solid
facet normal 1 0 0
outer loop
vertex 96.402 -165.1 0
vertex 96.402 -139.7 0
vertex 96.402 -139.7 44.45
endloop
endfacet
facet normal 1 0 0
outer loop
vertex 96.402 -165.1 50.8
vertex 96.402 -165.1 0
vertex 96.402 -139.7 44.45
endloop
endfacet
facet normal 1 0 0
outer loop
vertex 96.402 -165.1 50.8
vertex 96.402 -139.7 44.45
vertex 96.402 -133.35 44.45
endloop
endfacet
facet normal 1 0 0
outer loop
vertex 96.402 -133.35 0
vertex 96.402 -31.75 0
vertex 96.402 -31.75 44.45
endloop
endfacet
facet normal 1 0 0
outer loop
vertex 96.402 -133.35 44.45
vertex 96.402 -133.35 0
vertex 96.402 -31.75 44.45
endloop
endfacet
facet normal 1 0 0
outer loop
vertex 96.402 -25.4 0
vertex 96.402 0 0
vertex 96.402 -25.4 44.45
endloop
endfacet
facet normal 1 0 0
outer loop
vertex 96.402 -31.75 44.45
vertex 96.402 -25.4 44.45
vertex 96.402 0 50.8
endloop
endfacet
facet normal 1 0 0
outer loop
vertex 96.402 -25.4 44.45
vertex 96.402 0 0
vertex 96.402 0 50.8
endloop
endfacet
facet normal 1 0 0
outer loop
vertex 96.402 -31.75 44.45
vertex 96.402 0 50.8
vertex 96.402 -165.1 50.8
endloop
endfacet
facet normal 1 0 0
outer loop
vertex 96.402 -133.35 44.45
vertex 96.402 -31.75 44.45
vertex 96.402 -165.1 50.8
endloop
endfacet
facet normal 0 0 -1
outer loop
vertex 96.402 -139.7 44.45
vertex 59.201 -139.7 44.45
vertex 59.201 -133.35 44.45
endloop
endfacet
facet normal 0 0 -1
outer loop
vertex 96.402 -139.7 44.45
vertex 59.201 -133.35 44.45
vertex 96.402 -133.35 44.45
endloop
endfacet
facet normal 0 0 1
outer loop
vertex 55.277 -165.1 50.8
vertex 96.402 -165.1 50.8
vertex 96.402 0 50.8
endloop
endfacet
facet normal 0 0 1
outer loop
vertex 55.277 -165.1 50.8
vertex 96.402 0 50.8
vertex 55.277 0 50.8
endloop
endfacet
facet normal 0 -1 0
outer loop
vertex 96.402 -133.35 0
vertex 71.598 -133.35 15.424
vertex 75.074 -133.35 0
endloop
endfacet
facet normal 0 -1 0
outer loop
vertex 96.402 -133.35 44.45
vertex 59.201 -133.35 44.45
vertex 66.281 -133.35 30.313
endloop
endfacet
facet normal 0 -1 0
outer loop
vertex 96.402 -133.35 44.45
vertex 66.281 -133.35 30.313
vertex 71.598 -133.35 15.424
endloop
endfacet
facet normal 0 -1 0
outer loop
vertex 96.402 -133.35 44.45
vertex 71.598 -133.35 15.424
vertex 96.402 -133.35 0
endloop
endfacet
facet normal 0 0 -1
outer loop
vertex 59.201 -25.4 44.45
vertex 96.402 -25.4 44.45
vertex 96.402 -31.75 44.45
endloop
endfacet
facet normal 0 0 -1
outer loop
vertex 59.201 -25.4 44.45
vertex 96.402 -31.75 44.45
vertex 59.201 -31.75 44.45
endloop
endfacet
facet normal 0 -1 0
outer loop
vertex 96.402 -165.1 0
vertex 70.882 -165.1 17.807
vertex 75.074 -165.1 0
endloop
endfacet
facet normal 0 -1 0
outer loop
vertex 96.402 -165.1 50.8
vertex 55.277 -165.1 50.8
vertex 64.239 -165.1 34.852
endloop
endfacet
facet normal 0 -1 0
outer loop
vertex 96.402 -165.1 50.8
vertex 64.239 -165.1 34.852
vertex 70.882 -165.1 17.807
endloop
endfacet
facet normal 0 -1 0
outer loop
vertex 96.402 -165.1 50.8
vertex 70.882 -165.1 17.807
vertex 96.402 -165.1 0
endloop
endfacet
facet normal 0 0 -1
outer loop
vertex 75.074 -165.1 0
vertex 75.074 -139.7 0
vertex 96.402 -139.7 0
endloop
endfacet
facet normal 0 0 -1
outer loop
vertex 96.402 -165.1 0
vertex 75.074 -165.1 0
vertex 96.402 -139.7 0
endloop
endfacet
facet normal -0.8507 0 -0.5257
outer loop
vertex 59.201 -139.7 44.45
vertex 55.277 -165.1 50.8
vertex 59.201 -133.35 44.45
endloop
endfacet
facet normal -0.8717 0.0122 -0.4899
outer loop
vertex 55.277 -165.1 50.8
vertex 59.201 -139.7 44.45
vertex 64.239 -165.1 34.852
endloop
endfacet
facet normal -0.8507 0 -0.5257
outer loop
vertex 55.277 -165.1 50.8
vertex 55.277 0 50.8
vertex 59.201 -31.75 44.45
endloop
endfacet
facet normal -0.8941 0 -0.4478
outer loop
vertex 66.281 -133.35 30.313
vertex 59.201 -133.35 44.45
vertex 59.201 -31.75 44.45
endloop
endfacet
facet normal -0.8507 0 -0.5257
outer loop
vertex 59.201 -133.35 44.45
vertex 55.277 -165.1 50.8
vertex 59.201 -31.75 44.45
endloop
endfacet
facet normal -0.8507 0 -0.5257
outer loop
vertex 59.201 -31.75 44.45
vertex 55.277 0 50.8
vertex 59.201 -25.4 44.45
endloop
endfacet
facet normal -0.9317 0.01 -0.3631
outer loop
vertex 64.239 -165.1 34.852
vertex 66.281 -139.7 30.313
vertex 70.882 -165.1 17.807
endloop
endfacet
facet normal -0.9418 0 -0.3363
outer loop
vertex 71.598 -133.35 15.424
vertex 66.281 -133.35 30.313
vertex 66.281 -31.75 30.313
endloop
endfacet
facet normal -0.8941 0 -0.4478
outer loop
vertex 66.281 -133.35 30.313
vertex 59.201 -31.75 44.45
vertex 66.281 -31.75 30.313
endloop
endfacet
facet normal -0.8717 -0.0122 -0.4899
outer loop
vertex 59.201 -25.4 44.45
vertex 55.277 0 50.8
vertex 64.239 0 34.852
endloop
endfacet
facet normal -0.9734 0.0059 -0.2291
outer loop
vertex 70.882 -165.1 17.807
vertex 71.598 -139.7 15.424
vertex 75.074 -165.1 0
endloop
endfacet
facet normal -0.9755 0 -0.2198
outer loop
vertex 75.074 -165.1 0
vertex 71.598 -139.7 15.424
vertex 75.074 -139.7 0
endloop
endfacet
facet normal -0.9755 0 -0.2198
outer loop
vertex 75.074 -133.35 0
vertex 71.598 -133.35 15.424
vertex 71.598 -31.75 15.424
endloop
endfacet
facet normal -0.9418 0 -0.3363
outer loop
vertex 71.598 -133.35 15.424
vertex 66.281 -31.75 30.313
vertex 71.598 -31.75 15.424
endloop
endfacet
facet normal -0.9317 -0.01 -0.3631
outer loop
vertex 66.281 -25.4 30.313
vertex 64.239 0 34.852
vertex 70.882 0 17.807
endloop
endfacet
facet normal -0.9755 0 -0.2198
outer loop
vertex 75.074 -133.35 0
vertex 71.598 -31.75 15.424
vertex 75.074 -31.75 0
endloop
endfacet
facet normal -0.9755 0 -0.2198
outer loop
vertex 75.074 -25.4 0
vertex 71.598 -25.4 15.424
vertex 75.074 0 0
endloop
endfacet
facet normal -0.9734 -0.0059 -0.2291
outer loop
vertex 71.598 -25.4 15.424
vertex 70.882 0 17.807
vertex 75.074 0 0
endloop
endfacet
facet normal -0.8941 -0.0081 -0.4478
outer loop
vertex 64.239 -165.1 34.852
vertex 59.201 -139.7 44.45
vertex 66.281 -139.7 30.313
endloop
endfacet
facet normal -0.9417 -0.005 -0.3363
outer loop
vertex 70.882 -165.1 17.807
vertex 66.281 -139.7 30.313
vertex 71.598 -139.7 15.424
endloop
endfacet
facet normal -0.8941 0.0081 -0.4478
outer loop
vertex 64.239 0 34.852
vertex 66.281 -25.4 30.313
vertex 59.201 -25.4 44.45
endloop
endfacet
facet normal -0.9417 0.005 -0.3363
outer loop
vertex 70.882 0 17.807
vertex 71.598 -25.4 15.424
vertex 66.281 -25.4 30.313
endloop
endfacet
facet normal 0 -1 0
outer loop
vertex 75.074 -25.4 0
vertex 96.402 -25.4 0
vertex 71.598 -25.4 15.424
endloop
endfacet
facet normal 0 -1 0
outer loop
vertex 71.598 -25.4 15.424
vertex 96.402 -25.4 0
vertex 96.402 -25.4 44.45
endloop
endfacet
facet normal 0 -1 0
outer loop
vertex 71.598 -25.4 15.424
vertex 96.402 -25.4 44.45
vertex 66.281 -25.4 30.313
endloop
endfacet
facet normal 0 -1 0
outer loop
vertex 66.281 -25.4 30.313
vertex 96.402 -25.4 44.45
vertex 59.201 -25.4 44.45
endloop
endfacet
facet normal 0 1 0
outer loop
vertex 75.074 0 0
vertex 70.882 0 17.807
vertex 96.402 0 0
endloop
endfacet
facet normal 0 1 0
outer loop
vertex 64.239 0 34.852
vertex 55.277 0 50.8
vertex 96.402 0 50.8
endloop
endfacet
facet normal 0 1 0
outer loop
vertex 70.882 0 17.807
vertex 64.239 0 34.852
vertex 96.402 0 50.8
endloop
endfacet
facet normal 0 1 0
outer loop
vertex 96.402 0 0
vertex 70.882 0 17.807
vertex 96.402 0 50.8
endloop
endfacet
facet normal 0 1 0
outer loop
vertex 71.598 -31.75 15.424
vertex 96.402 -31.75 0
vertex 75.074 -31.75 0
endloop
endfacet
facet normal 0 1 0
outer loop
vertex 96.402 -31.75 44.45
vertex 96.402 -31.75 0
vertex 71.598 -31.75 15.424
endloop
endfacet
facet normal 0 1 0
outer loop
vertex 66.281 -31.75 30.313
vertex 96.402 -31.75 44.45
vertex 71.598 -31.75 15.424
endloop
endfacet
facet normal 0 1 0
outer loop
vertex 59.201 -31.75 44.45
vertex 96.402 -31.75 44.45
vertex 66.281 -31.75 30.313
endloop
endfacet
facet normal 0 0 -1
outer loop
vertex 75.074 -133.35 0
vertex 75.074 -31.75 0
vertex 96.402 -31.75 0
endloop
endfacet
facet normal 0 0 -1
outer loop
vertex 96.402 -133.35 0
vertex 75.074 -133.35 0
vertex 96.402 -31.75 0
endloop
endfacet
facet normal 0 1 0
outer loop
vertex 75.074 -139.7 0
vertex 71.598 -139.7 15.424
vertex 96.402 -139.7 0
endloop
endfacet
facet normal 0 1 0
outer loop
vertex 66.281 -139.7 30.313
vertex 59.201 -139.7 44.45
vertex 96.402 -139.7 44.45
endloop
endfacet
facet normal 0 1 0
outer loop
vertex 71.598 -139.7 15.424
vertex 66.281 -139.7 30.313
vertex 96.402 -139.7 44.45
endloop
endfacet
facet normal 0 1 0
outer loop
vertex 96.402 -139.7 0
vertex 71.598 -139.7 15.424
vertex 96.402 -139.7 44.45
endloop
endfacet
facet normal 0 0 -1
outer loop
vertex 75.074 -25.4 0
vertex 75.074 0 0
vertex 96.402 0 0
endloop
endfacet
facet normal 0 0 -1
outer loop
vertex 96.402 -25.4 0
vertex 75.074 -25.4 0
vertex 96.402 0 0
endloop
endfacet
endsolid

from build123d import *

# Parameters (mm, degrees)
F1_DEPTH = 165.1
F3_W     = 120.2936734515
F3_H     = 44.45
F4_DEPTH = 6.35
F6_W     = 105.5140421895
F6_H     = 44.45
F7_DEPTH = 6.35


with BuildPart() as f1:
    # F0 (on Front) → F1 (new body)
    with BuildSketch(Plane.XZ):
        with BuildLine():
            ThreePointArc((55.2767035972, 50.8), (67.8600718832, 26.4462179087), (75.0743229112, 0))
            Line((75.0743229112, 0), (96.4022464211, 0))
            Line((96.4022464211, 0), (96.4022464211, 50.8))
            Line((96.4022464211, 50.8), (55.2767035972, 50.8))
        make_face()
    extrude(amount=F1_DEPTH)

    # F3 (on offset) → F4 (cut)
    with BuildSketch(Plane.XZ.offset(139.7)):
        with Locations((60.1468367257, 22.225)):
            Rectangle(F3_W, F3_H)
    extrude(amount=-F4_DEPTH, mode=Mode.SUBTRACT)

    # F6 (on offset) → F7 (cut)
    with BuildSketch(Plane(origin=(0, -25.4, 0), x_dir=(-1, 0, 0), z_dir=(0, 1, 0))):
        with Locations((-52.7570210947, 22.225)):
            Rectangle(F6_W, F6_H)
    extrude(amount=-F7_DEPTH, mode=Mode.SUBTRACT)


solid = f1.part
